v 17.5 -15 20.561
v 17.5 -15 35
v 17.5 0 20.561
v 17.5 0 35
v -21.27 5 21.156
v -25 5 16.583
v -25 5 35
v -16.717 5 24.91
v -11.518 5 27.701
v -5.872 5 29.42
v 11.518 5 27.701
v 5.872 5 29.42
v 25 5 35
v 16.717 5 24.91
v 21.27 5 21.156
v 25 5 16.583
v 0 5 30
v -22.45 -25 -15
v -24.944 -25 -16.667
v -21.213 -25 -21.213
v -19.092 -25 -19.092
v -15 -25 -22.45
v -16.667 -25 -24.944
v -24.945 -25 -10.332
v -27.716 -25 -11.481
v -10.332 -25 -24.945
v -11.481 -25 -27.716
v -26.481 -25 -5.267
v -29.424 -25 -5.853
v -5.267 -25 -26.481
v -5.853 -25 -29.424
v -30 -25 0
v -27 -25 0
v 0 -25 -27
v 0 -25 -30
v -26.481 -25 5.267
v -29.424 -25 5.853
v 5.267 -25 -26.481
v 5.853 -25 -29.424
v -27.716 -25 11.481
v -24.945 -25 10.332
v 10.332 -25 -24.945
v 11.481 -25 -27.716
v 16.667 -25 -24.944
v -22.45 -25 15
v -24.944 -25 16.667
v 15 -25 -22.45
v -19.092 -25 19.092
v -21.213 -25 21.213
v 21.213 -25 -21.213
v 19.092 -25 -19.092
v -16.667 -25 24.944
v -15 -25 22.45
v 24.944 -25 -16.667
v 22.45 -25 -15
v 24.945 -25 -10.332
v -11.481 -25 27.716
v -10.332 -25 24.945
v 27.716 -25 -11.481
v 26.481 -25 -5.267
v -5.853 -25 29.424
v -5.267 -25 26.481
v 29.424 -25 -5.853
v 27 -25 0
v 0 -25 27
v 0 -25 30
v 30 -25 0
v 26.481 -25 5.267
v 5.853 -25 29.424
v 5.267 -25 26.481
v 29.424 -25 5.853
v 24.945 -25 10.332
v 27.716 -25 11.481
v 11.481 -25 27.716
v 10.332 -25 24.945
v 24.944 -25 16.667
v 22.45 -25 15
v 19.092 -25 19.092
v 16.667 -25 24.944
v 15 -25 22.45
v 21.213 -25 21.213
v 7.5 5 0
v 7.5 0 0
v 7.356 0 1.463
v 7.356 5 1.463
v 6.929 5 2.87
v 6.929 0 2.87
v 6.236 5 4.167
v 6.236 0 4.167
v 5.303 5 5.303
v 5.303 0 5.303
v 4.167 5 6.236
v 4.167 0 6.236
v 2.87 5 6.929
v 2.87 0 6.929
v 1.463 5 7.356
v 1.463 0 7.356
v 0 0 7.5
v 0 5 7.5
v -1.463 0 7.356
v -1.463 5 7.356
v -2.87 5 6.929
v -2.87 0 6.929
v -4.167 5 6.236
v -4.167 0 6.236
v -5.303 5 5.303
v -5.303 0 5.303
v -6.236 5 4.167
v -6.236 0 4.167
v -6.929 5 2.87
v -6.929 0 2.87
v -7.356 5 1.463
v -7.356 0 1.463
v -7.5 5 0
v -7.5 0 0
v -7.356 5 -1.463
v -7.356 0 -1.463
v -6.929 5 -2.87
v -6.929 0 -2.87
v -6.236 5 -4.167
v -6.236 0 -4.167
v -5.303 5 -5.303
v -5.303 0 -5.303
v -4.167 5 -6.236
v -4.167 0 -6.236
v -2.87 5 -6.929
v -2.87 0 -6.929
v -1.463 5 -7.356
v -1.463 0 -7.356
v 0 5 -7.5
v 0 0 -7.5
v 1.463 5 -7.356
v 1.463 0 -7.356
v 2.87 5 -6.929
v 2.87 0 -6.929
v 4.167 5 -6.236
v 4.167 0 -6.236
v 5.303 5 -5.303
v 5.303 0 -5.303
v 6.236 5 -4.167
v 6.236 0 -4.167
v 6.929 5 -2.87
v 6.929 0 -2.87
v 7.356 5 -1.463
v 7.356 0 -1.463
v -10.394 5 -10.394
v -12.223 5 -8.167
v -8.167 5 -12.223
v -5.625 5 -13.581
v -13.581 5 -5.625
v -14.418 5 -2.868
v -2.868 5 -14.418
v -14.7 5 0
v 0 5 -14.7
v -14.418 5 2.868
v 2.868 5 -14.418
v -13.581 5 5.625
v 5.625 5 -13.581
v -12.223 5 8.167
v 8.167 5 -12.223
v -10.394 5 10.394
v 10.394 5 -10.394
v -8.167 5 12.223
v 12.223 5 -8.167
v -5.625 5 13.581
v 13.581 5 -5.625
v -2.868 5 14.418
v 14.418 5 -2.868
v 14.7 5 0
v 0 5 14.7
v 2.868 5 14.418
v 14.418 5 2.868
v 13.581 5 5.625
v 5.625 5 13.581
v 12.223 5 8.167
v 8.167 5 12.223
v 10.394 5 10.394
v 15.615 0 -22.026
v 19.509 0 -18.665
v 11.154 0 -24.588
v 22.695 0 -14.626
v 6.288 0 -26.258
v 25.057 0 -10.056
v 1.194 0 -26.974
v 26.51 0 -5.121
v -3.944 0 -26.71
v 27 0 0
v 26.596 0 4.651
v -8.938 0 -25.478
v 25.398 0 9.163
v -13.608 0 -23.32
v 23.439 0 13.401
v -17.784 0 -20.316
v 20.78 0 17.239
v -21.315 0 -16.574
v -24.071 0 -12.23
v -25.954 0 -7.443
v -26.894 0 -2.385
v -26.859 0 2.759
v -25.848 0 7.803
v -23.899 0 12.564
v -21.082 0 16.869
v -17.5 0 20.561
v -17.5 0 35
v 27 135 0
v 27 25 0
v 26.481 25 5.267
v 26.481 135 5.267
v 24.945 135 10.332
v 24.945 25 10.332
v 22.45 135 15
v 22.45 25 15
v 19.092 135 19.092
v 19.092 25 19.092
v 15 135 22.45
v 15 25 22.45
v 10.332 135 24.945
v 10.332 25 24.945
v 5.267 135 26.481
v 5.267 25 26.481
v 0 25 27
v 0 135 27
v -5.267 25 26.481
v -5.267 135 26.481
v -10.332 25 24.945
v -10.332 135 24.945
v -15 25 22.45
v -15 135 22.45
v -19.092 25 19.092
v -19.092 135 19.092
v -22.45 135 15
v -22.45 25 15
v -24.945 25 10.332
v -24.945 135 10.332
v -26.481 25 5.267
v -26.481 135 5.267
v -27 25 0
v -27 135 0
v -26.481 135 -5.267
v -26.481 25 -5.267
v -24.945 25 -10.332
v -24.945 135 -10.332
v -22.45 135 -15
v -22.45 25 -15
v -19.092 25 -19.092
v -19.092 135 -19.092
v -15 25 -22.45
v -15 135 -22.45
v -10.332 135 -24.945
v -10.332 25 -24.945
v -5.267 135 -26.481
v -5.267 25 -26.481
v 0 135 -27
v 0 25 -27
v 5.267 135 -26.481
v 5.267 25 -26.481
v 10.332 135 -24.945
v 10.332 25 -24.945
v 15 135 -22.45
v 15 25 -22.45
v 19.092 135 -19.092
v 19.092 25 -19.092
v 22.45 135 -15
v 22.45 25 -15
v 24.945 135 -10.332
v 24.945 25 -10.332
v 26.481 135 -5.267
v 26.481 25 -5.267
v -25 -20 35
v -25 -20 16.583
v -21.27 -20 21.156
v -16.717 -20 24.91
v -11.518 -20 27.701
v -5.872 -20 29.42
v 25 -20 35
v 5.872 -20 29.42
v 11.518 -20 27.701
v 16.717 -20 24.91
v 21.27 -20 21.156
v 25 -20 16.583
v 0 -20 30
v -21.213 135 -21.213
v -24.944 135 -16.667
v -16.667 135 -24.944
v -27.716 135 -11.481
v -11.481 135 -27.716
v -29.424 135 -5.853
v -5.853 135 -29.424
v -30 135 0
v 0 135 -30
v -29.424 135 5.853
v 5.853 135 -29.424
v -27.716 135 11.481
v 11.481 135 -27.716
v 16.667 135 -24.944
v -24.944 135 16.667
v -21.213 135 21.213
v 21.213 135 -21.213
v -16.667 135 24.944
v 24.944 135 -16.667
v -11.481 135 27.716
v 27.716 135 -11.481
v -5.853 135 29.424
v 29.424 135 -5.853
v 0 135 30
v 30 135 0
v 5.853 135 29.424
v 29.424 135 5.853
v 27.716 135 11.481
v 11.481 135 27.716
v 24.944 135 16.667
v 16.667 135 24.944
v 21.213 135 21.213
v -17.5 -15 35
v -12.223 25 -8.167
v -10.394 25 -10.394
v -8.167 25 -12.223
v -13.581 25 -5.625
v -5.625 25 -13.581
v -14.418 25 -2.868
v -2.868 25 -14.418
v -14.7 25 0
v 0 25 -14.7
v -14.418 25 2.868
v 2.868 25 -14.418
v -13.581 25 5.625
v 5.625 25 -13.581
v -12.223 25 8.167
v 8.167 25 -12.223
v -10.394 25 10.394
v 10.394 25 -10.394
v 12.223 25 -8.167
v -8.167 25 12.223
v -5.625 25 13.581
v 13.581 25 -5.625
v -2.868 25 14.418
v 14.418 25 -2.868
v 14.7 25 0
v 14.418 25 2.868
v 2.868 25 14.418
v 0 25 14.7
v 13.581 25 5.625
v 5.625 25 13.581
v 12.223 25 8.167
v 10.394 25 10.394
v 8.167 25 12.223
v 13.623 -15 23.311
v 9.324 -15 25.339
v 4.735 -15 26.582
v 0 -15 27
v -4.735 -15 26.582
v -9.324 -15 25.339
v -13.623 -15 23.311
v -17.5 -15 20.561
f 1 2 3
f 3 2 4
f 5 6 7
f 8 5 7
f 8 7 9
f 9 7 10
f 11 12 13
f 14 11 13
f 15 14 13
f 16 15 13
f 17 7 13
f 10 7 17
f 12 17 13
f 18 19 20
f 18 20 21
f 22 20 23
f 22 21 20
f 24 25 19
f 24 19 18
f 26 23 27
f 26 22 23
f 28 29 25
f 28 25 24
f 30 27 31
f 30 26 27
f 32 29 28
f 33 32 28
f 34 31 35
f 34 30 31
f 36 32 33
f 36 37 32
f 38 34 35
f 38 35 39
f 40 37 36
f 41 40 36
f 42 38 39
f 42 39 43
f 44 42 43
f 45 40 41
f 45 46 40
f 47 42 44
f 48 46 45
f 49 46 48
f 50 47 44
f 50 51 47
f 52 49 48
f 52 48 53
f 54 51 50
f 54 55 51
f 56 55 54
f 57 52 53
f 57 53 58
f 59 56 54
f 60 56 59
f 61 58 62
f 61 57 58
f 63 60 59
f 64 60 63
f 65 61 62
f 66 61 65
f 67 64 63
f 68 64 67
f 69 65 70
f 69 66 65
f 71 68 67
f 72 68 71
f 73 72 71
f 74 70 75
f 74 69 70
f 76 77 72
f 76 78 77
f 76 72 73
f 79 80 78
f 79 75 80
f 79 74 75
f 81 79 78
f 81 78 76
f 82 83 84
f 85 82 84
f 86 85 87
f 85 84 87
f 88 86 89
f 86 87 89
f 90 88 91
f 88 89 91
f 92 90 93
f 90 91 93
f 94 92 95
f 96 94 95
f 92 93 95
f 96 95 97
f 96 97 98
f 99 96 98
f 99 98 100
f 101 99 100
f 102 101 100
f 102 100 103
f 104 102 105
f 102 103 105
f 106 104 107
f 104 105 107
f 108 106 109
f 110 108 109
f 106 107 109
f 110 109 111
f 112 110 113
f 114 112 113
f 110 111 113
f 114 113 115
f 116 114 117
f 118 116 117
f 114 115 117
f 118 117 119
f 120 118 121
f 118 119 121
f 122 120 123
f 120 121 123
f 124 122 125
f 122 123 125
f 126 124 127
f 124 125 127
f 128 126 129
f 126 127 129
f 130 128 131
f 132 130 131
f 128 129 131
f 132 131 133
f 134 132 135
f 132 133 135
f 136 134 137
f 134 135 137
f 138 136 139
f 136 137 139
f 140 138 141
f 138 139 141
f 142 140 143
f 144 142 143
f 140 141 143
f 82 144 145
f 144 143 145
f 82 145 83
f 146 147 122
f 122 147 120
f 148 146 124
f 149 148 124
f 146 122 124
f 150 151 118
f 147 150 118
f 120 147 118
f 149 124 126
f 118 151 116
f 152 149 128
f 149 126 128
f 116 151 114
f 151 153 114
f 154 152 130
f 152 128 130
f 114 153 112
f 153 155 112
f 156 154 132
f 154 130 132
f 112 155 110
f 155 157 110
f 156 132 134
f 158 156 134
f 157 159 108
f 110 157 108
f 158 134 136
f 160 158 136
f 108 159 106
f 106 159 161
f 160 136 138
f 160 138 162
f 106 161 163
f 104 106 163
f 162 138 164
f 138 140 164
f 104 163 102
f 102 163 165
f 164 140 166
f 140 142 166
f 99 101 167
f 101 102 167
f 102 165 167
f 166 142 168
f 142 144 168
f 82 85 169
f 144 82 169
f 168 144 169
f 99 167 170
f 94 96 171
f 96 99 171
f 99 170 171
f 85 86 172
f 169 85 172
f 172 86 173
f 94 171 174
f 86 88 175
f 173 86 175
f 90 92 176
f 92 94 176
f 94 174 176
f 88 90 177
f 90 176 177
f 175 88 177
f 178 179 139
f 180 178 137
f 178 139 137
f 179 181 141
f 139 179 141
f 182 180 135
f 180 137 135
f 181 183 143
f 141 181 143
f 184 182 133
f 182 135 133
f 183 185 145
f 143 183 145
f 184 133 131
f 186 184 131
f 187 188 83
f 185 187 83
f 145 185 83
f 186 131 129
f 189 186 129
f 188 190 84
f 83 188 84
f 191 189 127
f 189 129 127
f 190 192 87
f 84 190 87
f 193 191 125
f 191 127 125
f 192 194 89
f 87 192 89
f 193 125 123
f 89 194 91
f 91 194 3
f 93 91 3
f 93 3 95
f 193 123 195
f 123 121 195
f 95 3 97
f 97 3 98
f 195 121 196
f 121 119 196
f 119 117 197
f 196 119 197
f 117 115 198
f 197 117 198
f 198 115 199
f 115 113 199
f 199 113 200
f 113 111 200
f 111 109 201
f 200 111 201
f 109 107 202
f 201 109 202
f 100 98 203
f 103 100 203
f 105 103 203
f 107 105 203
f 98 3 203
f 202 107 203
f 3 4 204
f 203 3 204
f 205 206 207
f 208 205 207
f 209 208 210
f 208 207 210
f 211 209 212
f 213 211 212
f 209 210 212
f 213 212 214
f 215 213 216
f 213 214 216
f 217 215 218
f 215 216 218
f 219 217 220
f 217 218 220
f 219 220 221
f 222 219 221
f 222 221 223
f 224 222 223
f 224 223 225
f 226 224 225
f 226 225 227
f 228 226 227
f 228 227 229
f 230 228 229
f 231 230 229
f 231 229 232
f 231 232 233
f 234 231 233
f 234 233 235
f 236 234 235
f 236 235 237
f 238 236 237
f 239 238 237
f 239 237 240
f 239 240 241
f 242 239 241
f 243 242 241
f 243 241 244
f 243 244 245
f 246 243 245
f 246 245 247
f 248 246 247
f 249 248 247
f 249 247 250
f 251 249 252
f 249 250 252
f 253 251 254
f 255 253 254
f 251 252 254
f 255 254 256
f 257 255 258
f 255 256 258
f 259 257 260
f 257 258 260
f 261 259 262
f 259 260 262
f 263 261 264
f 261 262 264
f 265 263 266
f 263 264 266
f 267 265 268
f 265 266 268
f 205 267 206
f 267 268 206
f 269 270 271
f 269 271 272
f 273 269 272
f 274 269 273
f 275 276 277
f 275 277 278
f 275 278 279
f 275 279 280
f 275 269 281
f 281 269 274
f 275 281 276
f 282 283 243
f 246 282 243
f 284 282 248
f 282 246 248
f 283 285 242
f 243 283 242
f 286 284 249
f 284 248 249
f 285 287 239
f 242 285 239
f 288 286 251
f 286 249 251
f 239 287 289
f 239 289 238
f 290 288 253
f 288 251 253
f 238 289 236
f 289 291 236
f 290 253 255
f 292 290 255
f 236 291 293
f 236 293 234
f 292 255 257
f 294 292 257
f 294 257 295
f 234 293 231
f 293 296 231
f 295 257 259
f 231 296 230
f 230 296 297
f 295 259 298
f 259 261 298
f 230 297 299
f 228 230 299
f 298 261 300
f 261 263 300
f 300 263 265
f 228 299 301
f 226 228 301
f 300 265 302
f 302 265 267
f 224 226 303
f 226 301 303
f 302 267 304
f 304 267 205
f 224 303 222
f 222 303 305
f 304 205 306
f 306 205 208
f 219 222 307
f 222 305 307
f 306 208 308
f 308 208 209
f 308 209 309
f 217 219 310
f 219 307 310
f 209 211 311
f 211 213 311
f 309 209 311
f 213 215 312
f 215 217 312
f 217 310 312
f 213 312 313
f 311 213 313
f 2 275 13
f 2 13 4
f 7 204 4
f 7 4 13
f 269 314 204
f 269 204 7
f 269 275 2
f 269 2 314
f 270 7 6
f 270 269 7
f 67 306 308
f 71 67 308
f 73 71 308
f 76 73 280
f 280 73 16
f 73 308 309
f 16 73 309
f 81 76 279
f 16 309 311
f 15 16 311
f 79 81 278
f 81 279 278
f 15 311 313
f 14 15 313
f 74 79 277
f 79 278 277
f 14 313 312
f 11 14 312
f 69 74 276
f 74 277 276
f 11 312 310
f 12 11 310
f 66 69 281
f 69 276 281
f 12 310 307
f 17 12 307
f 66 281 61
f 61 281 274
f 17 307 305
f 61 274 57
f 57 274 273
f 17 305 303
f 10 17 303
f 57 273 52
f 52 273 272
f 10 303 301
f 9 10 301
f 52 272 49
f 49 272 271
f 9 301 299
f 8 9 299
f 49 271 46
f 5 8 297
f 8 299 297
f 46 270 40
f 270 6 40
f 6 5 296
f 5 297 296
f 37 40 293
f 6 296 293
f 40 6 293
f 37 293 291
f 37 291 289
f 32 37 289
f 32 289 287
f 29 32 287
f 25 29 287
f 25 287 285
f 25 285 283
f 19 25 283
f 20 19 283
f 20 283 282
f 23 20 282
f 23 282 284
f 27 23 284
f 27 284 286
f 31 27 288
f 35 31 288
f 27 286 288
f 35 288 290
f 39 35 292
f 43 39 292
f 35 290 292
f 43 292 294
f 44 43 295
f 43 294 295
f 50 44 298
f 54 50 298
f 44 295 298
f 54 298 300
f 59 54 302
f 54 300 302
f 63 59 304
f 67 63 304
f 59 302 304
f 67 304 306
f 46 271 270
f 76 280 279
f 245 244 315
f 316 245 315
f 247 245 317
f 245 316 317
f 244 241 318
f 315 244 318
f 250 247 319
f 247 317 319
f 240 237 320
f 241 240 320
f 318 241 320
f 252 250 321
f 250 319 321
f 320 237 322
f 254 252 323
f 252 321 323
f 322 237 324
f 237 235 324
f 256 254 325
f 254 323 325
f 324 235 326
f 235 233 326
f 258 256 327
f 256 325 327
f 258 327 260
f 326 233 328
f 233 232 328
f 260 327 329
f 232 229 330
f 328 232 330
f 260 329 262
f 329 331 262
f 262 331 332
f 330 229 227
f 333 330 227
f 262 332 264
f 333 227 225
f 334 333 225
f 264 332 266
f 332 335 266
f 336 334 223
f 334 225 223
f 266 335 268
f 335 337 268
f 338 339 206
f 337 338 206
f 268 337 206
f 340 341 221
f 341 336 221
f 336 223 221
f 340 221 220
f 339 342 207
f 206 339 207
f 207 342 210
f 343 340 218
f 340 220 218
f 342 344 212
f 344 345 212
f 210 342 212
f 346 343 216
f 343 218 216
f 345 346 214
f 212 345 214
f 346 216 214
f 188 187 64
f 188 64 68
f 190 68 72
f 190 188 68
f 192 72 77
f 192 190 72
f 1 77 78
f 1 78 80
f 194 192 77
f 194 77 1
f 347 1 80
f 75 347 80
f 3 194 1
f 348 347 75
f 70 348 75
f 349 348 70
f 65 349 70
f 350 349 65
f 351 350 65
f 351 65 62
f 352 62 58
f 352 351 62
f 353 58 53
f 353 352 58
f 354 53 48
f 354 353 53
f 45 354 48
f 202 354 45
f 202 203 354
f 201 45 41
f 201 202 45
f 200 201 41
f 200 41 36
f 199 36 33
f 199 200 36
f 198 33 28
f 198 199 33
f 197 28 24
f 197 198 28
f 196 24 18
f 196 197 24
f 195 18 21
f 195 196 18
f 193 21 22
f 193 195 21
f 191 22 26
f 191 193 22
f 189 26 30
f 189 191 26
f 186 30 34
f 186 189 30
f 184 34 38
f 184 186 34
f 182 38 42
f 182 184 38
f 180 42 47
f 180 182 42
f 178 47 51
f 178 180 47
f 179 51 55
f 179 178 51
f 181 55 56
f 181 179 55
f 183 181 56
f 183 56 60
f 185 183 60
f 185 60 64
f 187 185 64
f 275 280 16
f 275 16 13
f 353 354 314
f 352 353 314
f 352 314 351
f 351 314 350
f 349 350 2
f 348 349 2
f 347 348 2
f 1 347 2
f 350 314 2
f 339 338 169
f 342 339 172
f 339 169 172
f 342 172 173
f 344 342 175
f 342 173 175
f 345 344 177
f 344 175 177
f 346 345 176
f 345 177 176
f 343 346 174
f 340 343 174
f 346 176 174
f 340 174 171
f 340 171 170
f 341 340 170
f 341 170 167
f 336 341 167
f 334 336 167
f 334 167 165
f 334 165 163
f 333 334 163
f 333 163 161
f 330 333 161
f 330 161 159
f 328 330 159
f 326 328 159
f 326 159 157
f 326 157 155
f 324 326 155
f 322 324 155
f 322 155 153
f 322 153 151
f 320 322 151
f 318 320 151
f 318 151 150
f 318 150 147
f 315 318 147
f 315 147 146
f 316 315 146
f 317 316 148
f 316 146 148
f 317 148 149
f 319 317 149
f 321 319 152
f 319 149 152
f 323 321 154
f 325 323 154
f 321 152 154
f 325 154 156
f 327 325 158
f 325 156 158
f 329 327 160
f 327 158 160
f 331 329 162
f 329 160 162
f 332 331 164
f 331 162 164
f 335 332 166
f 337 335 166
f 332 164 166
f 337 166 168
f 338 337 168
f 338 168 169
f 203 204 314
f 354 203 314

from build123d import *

# Parameters (mm, degrees)
F0_R          = 30
F0_R_2        = 27
F1_DEPTH      = 135
F1_DEPTH_BACK = 25
F0_R_3        = 14.7
F2_DEPTH      = 25
F0_R_4        = 7.5
F3_DEPTH      = 5
F5_DEPTH      = 20
F5_DEPTH_BACK = 5
F7_DEPTH      = 20


with BuildPart() as f1:
    # F0 (on Front) → F1 (new body, two sides)
    with BuildSketch(Plane.XZ) as f1_sk:
        Circle(F0_R)
        Circle(F0_R_2, mode=Mode.SUBTRACT)
    extrude(amount=-F1_DEPTH)
    extrude(f1_sk.sketch, amount=F1_DEPTH_BACK)

    # F0 (on Front) → F2 (join)
    with BuildSketch(Plane.XZ):
        Circle(F0_R_2)
        Circle(F0_R_3, mode=Mode.SUBTRACT)
    extrude(amount=-F2_DEPTH)

    # F0 (on Front) → F3 (join)
    with BuildSketch(Plane.XZ):
        Circle(F0_R_3)
        Circle(F0_R_4, mode=Mode.SUBTRACT)
    extrude(amount=-F3_DEPTH)

    # F4 (on Front) → F5 (join, two sides)
    with BuildSketch(Plane.XZ) as f5_sk:
        with BuildLine():
            Line((-25, 35), (-25, 16.5831239518))
            ThreePointArc((-25, 16.5831239518), (0, 30), (25, 16.5831239518))
            Line((25, 16.5831239518), (25, 35))
            Line((25, 35), (-25, 35))
        make_face()
    extrude(amount=F5_DEPTH)
    extrude(f5_sk.sketch, amount=-F5_DEPTH_BACK)

    # F6 (on face) → F7 (cut)
    with BuildSketch(Plane.XY.offset(35)):
        Polygon((0, 0), (-17.5, 0), (-17.5, -15), (17.5, -15), (17.5, 0), align=None)
    extrude(amount=-F7_DEPTH, mode=Mode.SUBTRACT)


solid = f1.part
